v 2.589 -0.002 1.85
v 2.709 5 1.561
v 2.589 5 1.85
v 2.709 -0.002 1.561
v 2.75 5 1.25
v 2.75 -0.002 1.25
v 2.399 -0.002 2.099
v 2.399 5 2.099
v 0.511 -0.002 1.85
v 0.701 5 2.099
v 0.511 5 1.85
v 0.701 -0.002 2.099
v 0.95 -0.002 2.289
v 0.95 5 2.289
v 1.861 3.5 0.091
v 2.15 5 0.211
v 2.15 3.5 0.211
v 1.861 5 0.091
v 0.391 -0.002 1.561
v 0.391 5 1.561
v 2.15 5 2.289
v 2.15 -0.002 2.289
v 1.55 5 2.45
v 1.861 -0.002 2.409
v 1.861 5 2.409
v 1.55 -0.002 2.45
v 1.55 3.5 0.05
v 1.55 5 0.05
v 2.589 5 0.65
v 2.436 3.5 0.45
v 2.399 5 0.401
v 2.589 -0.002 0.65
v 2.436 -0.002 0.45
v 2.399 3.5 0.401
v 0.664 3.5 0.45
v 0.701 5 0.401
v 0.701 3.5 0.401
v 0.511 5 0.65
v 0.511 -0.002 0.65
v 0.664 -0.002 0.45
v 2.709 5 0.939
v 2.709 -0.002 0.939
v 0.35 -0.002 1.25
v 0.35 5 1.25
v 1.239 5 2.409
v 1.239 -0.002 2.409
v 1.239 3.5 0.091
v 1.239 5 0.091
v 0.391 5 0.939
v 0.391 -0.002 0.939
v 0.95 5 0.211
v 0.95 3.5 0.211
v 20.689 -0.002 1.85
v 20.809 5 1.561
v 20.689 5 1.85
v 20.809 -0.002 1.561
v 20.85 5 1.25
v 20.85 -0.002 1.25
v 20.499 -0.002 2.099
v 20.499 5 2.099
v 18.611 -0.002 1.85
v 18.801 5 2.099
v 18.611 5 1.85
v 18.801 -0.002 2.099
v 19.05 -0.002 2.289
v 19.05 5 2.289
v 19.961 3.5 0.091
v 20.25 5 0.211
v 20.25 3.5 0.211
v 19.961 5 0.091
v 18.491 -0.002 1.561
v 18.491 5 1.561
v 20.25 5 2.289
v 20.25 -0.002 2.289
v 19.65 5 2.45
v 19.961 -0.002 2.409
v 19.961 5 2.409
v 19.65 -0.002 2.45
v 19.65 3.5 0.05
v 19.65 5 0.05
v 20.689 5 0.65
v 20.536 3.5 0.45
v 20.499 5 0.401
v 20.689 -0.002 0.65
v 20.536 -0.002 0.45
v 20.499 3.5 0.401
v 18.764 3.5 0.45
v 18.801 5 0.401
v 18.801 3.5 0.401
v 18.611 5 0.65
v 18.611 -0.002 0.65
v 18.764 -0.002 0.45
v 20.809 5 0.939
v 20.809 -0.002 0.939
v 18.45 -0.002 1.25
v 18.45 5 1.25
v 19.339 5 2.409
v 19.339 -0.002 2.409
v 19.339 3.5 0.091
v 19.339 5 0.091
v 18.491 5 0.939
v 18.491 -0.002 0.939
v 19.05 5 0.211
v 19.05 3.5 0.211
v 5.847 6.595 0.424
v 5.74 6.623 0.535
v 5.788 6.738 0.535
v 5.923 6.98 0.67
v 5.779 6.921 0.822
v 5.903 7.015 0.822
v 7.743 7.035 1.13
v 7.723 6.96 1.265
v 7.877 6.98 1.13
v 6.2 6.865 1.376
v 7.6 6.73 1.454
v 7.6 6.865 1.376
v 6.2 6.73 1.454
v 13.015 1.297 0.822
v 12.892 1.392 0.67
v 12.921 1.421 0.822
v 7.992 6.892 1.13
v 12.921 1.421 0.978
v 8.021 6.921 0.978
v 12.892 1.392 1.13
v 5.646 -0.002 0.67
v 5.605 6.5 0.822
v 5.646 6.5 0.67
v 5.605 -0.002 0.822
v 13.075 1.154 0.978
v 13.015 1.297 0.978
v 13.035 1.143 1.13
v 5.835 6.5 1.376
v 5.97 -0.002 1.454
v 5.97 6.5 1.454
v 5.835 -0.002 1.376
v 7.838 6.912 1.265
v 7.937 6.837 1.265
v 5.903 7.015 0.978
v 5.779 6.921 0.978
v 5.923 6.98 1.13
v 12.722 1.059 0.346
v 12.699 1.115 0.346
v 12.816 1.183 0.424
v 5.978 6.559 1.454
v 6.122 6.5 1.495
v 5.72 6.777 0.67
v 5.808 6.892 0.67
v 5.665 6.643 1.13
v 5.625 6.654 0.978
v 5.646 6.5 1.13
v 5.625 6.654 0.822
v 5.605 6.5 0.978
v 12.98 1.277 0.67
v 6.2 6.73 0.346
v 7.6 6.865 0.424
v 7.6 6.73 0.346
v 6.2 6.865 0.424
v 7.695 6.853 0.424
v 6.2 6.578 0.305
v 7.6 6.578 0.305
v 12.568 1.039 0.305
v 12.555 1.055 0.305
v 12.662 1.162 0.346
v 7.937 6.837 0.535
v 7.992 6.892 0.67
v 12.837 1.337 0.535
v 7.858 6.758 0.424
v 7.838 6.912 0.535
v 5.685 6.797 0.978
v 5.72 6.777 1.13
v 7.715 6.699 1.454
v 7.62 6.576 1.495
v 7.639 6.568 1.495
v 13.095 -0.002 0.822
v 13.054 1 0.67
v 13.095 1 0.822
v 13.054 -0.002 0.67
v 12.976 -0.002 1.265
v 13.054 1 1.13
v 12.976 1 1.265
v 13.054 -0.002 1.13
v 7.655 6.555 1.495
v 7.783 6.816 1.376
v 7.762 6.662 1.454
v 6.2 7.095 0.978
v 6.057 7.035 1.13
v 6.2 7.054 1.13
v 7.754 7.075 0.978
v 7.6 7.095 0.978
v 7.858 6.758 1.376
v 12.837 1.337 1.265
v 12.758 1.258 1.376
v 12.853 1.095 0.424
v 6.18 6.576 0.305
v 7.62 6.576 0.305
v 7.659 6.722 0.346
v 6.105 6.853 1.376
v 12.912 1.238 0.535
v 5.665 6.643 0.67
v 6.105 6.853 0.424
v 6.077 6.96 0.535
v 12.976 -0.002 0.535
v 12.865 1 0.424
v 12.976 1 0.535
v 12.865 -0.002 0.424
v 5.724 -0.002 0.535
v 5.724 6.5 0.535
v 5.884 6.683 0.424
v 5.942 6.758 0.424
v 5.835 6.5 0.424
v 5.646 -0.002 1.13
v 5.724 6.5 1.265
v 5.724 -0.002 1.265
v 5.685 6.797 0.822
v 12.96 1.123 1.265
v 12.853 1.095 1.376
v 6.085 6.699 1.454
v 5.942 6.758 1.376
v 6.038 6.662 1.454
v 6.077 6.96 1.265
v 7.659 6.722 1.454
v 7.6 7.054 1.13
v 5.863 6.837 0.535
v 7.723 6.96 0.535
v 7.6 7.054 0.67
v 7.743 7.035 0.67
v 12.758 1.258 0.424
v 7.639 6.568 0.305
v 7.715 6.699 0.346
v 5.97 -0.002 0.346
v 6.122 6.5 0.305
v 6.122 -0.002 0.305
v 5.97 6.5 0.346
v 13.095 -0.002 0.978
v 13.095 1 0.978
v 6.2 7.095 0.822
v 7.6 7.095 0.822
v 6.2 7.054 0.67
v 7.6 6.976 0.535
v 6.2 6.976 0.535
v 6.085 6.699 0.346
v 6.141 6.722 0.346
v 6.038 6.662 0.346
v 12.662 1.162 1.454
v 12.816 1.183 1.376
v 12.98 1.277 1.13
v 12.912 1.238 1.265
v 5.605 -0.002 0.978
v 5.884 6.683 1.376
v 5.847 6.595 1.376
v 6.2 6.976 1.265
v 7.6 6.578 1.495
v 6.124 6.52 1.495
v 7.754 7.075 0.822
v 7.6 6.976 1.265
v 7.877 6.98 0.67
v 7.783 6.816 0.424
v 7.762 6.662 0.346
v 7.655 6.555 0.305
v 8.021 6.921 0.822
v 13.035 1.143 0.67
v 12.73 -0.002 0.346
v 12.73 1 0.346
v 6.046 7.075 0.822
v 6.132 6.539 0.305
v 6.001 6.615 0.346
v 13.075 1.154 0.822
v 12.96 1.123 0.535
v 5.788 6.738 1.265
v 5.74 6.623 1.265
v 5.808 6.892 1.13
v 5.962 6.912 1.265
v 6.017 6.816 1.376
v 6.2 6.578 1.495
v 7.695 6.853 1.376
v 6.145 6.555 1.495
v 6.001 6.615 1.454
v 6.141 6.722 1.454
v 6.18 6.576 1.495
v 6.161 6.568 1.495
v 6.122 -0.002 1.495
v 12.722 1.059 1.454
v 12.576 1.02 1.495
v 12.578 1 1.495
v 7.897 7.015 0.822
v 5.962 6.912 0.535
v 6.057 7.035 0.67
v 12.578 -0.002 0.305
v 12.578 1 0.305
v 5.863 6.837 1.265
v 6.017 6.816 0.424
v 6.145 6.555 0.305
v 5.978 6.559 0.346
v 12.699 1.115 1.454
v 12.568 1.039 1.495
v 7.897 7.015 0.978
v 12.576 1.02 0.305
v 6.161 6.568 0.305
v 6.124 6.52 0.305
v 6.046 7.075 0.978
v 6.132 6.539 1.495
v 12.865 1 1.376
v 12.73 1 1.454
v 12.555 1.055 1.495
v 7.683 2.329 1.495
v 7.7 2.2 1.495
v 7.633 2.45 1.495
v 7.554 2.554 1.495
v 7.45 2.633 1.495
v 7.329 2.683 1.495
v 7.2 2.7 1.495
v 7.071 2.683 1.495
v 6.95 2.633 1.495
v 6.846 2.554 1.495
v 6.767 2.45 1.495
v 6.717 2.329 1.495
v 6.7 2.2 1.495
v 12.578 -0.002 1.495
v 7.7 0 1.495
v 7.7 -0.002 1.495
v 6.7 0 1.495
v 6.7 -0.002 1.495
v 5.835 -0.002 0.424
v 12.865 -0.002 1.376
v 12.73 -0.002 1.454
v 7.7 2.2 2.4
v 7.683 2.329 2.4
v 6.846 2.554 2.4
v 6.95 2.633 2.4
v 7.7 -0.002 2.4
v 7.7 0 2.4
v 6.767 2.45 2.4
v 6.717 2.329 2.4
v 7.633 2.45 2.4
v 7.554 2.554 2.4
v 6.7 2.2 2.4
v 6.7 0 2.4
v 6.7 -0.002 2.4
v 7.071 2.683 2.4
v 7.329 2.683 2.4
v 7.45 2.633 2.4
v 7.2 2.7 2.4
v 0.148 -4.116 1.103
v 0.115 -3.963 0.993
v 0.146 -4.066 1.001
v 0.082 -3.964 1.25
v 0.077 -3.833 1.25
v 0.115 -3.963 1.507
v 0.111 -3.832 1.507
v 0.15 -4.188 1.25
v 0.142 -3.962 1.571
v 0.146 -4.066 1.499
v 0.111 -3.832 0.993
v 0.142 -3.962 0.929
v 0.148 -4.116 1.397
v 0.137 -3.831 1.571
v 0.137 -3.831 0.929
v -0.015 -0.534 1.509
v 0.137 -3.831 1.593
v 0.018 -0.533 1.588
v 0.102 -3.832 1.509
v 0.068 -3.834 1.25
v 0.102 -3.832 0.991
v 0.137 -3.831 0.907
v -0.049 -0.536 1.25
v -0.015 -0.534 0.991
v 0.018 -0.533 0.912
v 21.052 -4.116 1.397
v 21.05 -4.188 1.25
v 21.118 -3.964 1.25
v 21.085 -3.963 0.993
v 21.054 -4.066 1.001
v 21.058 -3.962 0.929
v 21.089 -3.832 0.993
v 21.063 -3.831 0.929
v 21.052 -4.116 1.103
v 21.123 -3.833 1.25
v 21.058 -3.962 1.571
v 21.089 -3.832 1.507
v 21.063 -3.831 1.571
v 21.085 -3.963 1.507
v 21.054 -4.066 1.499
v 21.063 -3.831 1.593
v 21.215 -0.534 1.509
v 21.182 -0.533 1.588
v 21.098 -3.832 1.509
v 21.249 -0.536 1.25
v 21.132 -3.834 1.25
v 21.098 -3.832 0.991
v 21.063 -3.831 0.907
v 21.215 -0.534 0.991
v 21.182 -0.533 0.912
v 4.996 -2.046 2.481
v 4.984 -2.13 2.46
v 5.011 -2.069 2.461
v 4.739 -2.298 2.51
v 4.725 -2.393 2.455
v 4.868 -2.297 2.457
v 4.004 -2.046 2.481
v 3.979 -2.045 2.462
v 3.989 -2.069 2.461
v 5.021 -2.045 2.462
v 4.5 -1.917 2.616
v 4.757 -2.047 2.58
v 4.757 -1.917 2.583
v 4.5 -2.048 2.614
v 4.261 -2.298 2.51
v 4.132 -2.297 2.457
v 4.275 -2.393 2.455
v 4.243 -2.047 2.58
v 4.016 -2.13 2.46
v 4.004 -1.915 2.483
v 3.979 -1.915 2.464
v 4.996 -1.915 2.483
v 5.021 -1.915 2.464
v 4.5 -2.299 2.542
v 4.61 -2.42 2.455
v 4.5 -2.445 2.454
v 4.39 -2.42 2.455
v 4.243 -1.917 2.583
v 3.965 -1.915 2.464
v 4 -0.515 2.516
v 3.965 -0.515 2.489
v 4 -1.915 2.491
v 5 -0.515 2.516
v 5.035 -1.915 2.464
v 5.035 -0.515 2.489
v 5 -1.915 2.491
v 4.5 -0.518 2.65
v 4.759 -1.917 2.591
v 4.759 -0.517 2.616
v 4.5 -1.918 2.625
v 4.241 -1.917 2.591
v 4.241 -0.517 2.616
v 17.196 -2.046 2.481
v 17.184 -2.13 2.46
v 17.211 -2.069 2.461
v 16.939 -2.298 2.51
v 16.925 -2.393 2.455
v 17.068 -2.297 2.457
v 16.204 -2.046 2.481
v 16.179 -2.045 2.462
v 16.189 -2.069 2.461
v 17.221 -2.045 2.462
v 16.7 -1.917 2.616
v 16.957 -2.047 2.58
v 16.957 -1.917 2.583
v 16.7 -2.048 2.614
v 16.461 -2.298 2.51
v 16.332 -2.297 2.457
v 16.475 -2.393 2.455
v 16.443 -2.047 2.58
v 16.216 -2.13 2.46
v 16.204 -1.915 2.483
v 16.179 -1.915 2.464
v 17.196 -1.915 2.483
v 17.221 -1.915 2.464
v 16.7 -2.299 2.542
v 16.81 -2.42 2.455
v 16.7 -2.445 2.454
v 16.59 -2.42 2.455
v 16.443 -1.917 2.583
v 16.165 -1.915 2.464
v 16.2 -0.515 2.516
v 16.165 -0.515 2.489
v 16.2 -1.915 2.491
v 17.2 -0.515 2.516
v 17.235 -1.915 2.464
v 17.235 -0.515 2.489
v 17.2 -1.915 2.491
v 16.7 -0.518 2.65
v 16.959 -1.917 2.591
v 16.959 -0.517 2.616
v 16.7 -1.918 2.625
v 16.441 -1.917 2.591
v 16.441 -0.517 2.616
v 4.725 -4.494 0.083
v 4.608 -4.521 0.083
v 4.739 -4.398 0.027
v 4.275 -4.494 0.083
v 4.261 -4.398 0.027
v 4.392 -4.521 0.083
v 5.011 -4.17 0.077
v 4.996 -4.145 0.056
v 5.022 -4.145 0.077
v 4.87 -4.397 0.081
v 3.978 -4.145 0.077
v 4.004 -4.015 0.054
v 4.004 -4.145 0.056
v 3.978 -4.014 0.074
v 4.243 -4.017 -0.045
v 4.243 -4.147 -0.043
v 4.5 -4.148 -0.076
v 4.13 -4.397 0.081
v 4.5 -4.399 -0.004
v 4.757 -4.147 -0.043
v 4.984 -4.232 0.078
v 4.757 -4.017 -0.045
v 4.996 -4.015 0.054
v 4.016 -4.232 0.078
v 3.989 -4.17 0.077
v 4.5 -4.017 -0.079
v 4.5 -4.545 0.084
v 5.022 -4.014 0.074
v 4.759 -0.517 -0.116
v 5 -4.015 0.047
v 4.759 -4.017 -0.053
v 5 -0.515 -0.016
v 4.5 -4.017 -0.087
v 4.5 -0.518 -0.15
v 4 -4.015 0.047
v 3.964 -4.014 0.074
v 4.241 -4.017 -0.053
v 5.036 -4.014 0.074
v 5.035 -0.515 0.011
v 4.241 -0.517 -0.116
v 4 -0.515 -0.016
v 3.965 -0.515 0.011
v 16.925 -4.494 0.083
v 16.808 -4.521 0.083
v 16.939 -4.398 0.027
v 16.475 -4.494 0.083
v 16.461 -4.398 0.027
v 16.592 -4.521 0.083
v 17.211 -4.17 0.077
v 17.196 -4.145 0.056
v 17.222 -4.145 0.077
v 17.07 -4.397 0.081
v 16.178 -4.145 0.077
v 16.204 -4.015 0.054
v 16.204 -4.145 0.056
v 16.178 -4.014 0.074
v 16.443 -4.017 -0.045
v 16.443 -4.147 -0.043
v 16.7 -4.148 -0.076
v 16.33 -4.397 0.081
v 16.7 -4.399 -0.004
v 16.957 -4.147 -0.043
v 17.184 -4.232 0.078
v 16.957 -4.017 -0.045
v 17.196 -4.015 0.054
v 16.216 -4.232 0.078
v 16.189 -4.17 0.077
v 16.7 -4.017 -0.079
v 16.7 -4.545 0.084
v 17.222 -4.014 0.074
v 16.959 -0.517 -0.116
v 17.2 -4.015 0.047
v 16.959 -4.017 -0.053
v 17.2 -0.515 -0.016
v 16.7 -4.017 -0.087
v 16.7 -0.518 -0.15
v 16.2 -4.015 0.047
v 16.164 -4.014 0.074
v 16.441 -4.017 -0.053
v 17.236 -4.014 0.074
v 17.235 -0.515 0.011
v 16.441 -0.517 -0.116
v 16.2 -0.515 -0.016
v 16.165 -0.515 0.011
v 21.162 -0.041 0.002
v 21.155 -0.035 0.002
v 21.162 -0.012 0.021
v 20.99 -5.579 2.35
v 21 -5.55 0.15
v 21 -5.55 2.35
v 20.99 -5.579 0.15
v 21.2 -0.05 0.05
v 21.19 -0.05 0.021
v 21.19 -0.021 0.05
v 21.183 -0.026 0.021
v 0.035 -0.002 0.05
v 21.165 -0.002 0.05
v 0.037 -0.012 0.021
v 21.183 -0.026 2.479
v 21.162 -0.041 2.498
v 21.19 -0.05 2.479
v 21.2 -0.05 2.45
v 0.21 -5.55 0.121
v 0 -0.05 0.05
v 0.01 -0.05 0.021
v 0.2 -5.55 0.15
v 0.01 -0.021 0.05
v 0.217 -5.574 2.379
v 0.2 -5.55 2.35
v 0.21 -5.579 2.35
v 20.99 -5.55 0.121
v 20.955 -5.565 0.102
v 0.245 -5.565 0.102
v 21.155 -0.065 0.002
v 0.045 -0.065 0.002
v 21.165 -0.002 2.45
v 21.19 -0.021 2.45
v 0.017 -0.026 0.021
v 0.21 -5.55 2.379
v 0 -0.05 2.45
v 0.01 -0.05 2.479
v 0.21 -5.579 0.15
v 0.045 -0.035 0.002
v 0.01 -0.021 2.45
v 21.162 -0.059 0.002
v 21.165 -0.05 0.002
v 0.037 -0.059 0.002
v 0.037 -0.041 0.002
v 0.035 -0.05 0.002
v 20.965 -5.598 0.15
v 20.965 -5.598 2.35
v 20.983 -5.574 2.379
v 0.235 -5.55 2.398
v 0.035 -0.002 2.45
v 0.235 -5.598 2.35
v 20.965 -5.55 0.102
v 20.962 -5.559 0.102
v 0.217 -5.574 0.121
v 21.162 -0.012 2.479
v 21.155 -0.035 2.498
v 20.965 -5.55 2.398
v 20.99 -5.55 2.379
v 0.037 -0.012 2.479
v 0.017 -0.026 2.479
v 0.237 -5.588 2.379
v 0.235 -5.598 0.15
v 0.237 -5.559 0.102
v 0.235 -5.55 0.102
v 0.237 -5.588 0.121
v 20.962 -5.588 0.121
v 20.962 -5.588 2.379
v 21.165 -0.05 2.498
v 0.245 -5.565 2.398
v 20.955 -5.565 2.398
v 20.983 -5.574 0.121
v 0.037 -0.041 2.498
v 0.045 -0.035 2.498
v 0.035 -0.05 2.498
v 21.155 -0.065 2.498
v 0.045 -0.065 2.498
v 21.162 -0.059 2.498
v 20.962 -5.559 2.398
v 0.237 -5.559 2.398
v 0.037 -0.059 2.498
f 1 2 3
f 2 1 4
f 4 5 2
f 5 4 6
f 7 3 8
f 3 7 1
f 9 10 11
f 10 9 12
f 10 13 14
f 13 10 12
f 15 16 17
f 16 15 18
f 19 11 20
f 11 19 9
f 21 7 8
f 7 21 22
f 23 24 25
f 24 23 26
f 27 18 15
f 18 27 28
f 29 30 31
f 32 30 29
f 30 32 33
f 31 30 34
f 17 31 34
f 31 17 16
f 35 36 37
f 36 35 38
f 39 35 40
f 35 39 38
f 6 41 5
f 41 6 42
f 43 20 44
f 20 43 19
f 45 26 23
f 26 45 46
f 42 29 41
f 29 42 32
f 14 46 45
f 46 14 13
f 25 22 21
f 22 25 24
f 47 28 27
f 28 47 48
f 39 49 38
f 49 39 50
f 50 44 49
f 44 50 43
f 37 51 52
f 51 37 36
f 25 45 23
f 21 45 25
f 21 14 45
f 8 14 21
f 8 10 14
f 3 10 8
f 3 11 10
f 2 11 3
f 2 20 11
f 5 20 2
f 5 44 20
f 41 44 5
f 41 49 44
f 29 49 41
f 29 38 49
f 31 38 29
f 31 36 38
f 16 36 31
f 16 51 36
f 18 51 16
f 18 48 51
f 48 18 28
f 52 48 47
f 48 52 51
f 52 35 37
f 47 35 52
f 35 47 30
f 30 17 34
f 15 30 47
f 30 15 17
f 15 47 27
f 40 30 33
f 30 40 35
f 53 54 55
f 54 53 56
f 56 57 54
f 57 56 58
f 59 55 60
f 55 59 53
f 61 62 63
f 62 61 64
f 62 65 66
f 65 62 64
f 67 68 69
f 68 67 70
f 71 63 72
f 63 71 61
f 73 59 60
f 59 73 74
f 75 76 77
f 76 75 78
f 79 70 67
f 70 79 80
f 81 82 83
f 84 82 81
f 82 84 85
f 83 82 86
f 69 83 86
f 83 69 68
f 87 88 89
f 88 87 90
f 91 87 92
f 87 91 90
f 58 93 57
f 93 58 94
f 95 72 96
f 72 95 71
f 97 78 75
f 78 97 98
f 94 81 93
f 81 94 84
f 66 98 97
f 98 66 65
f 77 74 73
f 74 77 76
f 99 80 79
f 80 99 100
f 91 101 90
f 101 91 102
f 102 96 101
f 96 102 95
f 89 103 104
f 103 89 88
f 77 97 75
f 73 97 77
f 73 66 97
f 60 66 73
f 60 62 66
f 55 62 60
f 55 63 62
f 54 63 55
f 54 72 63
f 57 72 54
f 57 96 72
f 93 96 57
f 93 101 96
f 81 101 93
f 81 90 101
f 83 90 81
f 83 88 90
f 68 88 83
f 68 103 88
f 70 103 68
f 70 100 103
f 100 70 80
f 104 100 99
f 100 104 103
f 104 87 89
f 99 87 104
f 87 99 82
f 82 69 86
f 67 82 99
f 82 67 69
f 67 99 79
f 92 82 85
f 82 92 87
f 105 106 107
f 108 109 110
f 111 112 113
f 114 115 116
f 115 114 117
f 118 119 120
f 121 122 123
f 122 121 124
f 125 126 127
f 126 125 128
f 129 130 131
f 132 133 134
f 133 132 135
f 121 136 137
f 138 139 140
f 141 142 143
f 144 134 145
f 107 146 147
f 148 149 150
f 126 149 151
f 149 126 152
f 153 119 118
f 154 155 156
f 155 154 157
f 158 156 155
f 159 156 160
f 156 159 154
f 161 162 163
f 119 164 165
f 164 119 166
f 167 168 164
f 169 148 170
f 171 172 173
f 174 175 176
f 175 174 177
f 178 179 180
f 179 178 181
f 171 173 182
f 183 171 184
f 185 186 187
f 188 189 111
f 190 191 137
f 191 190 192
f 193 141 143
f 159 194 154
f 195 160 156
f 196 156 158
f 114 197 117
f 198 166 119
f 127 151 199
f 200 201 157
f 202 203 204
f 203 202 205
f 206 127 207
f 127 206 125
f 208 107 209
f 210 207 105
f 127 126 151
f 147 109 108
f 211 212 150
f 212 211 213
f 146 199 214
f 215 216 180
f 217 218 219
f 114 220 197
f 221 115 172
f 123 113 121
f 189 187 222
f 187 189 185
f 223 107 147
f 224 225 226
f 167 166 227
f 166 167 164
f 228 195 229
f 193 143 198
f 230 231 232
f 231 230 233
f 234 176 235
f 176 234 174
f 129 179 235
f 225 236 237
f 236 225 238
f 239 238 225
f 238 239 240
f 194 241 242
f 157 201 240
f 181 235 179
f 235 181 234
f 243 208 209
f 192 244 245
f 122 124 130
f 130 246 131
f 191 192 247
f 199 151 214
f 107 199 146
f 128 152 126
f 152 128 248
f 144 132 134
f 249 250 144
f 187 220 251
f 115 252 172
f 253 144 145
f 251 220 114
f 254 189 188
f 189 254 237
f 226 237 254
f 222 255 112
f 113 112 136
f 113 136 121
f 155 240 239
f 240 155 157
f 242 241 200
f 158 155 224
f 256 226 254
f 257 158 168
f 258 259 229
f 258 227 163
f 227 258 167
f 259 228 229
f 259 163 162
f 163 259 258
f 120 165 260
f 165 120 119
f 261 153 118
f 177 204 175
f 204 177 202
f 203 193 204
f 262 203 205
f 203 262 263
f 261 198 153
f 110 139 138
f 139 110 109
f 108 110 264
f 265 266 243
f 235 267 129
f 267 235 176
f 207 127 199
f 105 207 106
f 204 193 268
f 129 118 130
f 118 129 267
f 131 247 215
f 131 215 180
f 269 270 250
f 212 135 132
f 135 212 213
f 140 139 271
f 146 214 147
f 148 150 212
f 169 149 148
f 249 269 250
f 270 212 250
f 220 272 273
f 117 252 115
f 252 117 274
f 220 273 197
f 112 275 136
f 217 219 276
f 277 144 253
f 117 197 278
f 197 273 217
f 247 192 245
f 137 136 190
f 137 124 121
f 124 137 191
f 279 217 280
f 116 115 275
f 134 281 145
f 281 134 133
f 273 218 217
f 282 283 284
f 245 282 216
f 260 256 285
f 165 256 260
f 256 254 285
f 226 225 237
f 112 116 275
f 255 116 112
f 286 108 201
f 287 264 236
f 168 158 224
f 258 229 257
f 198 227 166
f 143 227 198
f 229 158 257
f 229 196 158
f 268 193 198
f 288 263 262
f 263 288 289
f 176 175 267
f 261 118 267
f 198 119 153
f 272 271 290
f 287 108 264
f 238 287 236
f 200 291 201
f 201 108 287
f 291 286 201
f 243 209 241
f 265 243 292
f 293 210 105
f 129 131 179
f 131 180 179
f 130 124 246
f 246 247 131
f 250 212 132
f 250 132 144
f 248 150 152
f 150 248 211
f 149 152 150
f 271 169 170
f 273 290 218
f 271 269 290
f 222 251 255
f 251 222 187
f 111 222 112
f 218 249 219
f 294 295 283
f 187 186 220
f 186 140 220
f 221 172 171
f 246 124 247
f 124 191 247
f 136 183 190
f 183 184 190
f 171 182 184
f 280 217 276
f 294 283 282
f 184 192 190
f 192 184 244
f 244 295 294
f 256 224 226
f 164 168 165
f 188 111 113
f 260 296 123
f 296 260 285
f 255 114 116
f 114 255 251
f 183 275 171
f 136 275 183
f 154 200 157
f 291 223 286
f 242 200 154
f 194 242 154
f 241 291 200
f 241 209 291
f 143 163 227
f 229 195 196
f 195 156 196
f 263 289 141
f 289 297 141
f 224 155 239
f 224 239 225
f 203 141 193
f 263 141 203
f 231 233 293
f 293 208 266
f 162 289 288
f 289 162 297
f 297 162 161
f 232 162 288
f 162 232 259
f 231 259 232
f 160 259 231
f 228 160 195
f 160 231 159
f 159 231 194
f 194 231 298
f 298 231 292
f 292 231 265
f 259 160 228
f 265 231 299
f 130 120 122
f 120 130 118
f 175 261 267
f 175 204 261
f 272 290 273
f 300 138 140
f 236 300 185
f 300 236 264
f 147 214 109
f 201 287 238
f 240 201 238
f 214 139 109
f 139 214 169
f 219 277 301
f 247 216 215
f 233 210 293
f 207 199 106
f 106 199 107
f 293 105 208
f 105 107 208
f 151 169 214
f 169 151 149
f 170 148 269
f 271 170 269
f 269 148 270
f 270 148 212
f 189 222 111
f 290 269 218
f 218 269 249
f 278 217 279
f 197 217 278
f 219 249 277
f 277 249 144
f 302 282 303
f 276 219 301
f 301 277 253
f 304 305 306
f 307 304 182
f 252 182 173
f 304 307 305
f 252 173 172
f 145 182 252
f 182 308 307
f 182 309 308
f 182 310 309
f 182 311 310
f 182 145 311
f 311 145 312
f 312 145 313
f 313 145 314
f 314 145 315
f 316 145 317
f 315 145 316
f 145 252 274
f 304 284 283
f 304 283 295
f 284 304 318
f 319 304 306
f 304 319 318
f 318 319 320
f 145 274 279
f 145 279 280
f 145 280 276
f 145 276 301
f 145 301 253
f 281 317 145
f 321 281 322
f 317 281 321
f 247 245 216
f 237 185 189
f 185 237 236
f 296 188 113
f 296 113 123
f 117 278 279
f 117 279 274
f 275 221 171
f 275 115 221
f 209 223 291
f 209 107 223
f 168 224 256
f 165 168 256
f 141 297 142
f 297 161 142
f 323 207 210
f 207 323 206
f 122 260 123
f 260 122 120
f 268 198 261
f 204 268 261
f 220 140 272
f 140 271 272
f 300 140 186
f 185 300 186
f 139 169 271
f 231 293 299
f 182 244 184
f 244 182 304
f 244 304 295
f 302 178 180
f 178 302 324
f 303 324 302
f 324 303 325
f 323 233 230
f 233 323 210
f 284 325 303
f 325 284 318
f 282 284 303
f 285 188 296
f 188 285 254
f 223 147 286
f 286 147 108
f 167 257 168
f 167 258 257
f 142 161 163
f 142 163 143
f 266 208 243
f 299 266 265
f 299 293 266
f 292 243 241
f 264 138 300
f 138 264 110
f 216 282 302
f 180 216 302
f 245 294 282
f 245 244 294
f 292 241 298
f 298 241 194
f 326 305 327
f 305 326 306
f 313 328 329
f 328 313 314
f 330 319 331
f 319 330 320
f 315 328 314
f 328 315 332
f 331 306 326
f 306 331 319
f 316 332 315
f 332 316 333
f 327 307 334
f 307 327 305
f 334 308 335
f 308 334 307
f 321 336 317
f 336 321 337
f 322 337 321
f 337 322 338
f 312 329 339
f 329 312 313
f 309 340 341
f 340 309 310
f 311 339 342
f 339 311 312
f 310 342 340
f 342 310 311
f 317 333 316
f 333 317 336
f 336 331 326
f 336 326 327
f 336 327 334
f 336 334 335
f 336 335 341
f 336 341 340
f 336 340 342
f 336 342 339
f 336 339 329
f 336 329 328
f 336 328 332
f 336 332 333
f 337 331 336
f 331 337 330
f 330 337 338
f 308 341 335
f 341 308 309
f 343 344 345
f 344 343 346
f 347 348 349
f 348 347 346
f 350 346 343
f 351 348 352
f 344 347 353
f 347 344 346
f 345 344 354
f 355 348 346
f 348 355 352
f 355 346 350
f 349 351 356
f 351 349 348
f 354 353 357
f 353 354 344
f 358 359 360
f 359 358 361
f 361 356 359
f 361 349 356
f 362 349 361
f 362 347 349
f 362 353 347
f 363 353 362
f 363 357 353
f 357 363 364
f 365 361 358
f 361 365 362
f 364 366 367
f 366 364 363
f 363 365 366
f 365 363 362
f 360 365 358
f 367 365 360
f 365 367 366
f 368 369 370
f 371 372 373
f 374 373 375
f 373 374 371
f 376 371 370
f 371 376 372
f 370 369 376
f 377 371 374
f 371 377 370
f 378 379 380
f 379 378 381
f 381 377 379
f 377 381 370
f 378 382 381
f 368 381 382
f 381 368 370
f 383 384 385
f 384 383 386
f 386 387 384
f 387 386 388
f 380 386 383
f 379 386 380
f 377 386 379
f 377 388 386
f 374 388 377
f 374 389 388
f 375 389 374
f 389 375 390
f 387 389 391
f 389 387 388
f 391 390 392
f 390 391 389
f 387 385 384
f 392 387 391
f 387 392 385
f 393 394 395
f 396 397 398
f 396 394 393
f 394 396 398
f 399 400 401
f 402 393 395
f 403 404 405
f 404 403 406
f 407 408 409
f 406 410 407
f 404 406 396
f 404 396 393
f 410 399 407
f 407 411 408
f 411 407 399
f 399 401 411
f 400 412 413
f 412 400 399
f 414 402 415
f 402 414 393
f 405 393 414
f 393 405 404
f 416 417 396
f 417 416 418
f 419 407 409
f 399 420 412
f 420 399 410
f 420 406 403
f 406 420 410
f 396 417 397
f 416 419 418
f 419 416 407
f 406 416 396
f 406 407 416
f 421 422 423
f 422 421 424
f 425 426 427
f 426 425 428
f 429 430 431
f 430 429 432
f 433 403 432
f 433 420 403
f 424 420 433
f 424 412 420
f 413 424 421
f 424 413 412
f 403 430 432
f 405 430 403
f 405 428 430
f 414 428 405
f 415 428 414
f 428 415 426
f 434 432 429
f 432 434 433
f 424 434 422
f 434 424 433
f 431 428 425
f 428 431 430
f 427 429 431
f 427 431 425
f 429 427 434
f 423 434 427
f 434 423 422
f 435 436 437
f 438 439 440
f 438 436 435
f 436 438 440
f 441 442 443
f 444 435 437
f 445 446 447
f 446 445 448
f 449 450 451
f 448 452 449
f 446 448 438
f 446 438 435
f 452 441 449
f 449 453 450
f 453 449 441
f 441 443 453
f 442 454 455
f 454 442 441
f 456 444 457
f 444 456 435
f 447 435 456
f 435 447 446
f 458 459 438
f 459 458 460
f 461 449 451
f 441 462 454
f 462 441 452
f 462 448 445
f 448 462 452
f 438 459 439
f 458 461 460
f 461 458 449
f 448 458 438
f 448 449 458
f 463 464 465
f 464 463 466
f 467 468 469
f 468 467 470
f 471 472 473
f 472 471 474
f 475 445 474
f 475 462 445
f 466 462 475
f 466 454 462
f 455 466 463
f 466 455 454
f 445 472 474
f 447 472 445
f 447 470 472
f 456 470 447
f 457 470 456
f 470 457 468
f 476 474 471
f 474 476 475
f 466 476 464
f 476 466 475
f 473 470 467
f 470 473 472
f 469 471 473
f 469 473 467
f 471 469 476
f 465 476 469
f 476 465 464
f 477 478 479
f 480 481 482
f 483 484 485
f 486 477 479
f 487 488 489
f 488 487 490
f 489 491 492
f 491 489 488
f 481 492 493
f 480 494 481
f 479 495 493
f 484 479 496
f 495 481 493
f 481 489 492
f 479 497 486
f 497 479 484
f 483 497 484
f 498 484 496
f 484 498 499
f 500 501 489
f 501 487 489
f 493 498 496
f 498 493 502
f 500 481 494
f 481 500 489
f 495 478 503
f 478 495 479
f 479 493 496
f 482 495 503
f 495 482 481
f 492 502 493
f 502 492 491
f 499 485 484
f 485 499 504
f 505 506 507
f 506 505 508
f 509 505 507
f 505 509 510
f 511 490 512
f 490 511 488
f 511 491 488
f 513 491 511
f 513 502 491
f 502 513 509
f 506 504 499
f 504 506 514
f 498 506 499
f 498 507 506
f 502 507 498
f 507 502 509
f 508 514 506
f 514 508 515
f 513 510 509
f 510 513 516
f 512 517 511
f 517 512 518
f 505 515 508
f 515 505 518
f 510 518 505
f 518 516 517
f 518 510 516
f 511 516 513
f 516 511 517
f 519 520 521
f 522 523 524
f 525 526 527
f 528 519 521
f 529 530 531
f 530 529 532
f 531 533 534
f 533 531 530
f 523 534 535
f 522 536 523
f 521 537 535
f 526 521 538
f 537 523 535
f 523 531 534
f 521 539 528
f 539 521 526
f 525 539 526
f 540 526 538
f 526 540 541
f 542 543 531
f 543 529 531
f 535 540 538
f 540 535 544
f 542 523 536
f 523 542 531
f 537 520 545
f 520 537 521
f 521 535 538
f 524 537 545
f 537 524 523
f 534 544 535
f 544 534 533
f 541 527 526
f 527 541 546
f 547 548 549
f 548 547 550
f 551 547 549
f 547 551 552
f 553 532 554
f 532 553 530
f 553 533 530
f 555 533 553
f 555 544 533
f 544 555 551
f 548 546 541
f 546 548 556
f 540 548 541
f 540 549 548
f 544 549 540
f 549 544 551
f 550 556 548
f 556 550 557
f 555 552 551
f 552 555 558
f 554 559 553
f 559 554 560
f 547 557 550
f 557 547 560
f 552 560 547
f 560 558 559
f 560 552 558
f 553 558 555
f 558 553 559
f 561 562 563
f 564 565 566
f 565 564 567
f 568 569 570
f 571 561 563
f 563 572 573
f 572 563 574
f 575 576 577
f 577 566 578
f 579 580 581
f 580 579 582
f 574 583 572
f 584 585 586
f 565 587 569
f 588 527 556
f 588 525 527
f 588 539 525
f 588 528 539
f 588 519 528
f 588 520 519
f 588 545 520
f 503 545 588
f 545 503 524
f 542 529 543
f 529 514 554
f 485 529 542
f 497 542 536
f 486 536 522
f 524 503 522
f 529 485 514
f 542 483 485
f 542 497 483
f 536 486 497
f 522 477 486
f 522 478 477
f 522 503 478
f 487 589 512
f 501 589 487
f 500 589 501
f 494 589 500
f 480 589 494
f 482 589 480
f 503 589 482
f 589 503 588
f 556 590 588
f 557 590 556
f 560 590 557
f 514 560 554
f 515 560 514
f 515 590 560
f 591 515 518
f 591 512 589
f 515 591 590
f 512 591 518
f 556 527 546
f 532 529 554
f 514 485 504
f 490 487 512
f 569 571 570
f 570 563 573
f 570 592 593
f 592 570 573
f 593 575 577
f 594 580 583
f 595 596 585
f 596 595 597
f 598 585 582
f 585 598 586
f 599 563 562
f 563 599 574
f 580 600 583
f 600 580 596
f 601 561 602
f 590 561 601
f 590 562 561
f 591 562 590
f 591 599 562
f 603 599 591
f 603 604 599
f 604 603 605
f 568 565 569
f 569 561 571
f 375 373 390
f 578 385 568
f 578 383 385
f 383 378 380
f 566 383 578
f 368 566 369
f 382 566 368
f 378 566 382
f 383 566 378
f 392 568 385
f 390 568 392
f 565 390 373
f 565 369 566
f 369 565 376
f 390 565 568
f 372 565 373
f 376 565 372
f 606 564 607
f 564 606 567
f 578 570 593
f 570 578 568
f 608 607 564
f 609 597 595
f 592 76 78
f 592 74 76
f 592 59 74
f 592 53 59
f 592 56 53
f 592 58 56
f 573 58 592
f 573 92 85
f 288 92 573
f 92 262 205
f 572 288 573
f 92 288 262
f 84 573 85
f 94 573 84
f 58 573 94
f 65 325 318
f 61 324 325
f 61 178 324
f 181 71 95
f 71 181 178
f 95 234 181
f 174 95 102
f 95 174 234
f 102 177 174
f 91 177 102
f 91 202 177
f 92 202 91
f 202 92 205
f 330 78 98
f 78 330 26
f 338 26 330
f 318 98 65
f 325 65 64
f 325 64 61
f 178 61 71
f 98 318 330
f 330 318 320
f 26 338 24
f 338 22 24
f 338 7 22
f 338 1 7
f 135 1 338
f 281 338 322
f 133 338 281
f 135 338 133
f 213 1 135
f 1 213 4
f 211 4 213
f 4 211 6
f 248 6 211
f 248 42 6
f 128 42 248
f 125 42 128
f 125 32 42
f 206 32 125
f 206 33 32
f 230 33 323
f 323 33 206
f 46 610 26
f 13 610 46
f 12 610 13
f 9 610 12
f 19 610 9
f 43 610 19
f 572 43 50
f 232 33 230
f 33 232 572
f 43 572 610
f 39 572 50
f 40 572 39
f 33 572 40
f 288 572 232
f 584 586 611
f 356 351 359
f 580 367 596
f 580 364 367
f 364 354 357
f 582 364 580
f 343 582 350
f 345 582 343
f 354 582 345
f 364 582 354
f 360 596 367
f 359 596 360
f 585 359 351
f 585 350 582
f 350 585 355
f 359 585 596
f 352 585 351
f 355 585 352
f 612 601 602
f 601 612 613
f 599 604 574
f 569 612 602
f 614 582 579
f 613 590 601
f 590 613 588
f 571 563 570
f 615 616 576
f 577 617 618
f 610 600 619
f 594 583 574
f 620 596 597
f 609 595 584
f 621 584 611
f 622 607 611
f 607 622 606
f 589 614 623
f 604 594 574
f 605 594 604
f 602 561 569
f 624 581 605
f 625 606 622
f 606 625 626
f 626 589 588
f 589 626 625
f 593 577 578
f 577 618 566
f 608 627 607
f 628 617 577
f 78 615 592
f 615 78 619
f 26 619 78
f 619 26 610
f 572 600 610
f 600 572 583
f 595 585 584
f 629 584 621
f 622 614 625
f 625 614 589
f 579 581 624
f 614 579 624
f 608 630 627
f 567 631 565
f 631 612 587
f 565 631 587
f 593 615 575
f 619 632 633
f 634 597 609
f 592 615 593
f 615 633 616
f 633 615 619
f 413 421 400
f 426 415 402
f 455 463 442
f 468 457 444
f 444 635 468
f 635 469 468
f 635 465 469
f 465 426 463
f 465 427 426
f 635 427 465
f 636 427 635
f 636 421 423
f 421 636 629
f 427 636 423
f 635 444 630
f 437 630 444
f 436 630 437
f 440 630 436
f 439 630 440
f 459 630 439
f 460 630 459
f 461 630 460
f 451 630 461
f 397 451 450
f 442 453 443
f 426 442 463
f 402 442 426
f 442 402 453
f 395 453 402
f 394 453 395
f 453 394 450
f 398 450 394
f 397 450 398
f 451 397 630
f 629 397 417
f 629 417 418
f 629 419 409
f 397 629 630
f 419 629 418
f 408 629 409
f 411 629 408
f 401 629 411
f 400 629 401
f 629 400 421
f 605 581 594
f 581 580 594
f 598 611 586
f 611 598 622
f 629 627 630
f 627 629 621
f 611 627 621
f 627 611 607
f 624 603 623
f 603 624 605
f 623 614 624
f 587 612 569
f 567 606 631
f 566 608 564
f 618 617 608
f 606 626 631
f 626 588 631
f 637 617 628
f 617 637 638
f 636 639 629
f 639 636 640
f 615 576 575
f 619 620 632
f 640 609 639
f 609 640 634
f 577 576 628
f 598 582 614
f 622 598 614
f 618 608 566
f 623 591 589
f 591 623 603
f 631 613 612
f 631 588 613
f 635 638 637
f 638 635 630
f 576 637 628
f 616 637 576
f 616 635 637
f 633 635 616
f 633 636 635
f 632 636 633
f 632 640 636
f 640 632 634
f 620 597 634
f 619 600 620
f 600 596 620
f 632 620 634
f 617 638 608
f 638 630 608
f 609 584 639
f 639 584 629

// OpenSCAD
$fn=24;

HACK=0.001;

body_back_w = 21.2;
body_back_d = 2.5;
  
body_front_w = 20.8;
body_front_d = 2.3;

body_h = 5.6;

module half_pill(r, l) {
  rotate([90, 0, 0]) {
    translate([0, 0, l-r])
      sphere(r=r);
    cylinder(r=r, h=l-r);
  }
}


module main_body() {
  
  r = 0.05;
  
  back_w = body_back_w;
  back_d = body_back_d;
  
  front_w = body_front_w;
  front_d = body_front_d;
  
  
  // Sharp edges
/*
  rotate([90, 0, 0])
  translate([back_w/2, back_d/2])
    linear_extrude(body_h, scale=[front_w/back_w, front_d/back_d])
      square([back_w, back_d], center=true);
  */

  

  // Slow, but nicely rounded edges
  off_x = (back_w - front_w) / 2;
  off_z = (back_d - front_d) / 2;

  y = [ -r, -(body_h - r)];
  
  b_x = [ r, back_w - r];
  b_z = [ r, back_d - r];
  
  f_x = [ off_x + r, off_x + front_w - r ];
  f_z = [ off_z + r, off_z + front_d - r ];
  
  hull() {
    for (x = b_x)
      for (z = b_z)
        #translate([x, y[0], z])
          sphere(r=r, $fn=10);
    
    for (x = f_x)
      for (z = f_z)
        translate([x, y[1], z])
          sphere(r=r, $fn=10);
  }
  
}

guide_diam = 2.4;
guide_cc = 20.5 - guide_diam;
guide_length = 5;

module guide() {
  d = guide_diam;
  
  notch = 1.5;
  notch_d = d - 2;
  
  rotate([90, 0, 0])
    difference() {
      cylinder(d=d, h=guide_length + 1);
      
      translate([-d/2, -d - (d/2) + notch_d, notch])
      cube([d, d, guide_length + 1 - notch]);
    }
  
}

module wedge() {
  d = 1.2;
  r = d/2;
  
  wide = 7.5;
  narrow = 2;
  h_1 = 1;
  h_2 = 6.5;
  
  // The little ridge on top
  ridge_d = 2.1;
  ridge_w = 1;
  ridge_h = 2.7;
  ridge_x = 1.1 + (ridge_w/2);
  
  translate([0, 0, r])
  hull() {
    translate([r, -r, 0])
      sphere(r=r);
    
    translate([wide-r, -r, 0])
      sphere(r=r);
    
    translate([wide-r, h_1, 0])
      sphere(r=r);
    
    translate([r, h_2, 0])
      sphere(r=r);
    
    translate([r+narrow-r, h_2, 0])
      sphere(r=r);
    
  }
  
  translate([ridge_x, 0, 0])
    hull() {
      translate([0, 0, ridge_d])
      translate([0, 0, -ridge_d/2]) {
        
        cylinder(d=ridge_w, h=ridge_d/2);
        
        translate([0, ridge_h-ridge_w/2, 0])
        cylinder(d=ridge_w, h=ridge_d/2);
      }
    }
}


module eject_button() {
  pill_r = 1;
  
  
  w_pill_cc = 21.3 - 2*pill_r;
  w_pill_x = (body_back_w - w_pill_cc)/2;
  
  w_pill_angle = atan((body_back_w-body_front_w) / (2*body_h));
  w_pill_y = -0.5;
  w_pill_l = 4.3;
  

  d_pill_y = w_pill_y;
  d_pill_cc = 2.8 - 2*pill_r;
  d_pill_z = (body_back_d - d_pill_cc)/2;
  
  d_pill_angle = atan((body_back_d-body_front_d) / (2*body_h));
  d_pill_x1 = 4.5;
  d_pill_x2 = body_back_w - d_pill_x1;
  d_pill_l_top = 2.4;
  d_pill_l_bottom = 4.5;
  
  main_body();
  
  guide_1 = (body_back_w - guide_cc)/2;
  
  translate([guide_1, guide_length, body_back_d/2])
    guide();
  
  translate([guide_1 + guide_cc, guide_length, body_back_d/2])
    guide();
  
  translate([5.6, 0, 0.3])
    wedge();
  
  // The pills that expand the width
  translate([w_pill_x, w_pill_y, body_back_d/2])
    rotate([0, 0, w_pill_angle])
    half_pill(r=pill_r, l=w_pill_l);
    
  translate([w_pill_x + w_pill_cc, w_pill_y, body_back_d/2])
    rotate([0, 0, -w_pill_angle])
    half_pill(r=pill_r, l=w_pill_l);
    
    
  // The pills on the top edge
  translate([d_pill_x1, d_pill_y, d_pill_z + d_pill_cc])
    rotate([d_pill_angle, 0, 0])
    half_pill(r=pill_r, l=d_pill_l_top);

  translate([d_pill_x2, d_pill_y, d_pill_z + d_pill_cc])
    rotate([d_pill_angle, 0, 0])
    half_pill(r=pill_r, l=d_pill_l_top);
    
    
  translate([d_pill_x1, d_pill_y, d_pill_z])
    rotate([-d_pill_angle, 0, 0])
    half_pill(r=pill_r, l=d_pill_l_bottom);

  translate([d_pill_x2, d_pill_y, d_pill_z])
    rotate([-d_pill_angle, 0, 0])
    half_pill(r=pill_r, l=d_pill_l_bottom);
      
  
}




eject_button();
